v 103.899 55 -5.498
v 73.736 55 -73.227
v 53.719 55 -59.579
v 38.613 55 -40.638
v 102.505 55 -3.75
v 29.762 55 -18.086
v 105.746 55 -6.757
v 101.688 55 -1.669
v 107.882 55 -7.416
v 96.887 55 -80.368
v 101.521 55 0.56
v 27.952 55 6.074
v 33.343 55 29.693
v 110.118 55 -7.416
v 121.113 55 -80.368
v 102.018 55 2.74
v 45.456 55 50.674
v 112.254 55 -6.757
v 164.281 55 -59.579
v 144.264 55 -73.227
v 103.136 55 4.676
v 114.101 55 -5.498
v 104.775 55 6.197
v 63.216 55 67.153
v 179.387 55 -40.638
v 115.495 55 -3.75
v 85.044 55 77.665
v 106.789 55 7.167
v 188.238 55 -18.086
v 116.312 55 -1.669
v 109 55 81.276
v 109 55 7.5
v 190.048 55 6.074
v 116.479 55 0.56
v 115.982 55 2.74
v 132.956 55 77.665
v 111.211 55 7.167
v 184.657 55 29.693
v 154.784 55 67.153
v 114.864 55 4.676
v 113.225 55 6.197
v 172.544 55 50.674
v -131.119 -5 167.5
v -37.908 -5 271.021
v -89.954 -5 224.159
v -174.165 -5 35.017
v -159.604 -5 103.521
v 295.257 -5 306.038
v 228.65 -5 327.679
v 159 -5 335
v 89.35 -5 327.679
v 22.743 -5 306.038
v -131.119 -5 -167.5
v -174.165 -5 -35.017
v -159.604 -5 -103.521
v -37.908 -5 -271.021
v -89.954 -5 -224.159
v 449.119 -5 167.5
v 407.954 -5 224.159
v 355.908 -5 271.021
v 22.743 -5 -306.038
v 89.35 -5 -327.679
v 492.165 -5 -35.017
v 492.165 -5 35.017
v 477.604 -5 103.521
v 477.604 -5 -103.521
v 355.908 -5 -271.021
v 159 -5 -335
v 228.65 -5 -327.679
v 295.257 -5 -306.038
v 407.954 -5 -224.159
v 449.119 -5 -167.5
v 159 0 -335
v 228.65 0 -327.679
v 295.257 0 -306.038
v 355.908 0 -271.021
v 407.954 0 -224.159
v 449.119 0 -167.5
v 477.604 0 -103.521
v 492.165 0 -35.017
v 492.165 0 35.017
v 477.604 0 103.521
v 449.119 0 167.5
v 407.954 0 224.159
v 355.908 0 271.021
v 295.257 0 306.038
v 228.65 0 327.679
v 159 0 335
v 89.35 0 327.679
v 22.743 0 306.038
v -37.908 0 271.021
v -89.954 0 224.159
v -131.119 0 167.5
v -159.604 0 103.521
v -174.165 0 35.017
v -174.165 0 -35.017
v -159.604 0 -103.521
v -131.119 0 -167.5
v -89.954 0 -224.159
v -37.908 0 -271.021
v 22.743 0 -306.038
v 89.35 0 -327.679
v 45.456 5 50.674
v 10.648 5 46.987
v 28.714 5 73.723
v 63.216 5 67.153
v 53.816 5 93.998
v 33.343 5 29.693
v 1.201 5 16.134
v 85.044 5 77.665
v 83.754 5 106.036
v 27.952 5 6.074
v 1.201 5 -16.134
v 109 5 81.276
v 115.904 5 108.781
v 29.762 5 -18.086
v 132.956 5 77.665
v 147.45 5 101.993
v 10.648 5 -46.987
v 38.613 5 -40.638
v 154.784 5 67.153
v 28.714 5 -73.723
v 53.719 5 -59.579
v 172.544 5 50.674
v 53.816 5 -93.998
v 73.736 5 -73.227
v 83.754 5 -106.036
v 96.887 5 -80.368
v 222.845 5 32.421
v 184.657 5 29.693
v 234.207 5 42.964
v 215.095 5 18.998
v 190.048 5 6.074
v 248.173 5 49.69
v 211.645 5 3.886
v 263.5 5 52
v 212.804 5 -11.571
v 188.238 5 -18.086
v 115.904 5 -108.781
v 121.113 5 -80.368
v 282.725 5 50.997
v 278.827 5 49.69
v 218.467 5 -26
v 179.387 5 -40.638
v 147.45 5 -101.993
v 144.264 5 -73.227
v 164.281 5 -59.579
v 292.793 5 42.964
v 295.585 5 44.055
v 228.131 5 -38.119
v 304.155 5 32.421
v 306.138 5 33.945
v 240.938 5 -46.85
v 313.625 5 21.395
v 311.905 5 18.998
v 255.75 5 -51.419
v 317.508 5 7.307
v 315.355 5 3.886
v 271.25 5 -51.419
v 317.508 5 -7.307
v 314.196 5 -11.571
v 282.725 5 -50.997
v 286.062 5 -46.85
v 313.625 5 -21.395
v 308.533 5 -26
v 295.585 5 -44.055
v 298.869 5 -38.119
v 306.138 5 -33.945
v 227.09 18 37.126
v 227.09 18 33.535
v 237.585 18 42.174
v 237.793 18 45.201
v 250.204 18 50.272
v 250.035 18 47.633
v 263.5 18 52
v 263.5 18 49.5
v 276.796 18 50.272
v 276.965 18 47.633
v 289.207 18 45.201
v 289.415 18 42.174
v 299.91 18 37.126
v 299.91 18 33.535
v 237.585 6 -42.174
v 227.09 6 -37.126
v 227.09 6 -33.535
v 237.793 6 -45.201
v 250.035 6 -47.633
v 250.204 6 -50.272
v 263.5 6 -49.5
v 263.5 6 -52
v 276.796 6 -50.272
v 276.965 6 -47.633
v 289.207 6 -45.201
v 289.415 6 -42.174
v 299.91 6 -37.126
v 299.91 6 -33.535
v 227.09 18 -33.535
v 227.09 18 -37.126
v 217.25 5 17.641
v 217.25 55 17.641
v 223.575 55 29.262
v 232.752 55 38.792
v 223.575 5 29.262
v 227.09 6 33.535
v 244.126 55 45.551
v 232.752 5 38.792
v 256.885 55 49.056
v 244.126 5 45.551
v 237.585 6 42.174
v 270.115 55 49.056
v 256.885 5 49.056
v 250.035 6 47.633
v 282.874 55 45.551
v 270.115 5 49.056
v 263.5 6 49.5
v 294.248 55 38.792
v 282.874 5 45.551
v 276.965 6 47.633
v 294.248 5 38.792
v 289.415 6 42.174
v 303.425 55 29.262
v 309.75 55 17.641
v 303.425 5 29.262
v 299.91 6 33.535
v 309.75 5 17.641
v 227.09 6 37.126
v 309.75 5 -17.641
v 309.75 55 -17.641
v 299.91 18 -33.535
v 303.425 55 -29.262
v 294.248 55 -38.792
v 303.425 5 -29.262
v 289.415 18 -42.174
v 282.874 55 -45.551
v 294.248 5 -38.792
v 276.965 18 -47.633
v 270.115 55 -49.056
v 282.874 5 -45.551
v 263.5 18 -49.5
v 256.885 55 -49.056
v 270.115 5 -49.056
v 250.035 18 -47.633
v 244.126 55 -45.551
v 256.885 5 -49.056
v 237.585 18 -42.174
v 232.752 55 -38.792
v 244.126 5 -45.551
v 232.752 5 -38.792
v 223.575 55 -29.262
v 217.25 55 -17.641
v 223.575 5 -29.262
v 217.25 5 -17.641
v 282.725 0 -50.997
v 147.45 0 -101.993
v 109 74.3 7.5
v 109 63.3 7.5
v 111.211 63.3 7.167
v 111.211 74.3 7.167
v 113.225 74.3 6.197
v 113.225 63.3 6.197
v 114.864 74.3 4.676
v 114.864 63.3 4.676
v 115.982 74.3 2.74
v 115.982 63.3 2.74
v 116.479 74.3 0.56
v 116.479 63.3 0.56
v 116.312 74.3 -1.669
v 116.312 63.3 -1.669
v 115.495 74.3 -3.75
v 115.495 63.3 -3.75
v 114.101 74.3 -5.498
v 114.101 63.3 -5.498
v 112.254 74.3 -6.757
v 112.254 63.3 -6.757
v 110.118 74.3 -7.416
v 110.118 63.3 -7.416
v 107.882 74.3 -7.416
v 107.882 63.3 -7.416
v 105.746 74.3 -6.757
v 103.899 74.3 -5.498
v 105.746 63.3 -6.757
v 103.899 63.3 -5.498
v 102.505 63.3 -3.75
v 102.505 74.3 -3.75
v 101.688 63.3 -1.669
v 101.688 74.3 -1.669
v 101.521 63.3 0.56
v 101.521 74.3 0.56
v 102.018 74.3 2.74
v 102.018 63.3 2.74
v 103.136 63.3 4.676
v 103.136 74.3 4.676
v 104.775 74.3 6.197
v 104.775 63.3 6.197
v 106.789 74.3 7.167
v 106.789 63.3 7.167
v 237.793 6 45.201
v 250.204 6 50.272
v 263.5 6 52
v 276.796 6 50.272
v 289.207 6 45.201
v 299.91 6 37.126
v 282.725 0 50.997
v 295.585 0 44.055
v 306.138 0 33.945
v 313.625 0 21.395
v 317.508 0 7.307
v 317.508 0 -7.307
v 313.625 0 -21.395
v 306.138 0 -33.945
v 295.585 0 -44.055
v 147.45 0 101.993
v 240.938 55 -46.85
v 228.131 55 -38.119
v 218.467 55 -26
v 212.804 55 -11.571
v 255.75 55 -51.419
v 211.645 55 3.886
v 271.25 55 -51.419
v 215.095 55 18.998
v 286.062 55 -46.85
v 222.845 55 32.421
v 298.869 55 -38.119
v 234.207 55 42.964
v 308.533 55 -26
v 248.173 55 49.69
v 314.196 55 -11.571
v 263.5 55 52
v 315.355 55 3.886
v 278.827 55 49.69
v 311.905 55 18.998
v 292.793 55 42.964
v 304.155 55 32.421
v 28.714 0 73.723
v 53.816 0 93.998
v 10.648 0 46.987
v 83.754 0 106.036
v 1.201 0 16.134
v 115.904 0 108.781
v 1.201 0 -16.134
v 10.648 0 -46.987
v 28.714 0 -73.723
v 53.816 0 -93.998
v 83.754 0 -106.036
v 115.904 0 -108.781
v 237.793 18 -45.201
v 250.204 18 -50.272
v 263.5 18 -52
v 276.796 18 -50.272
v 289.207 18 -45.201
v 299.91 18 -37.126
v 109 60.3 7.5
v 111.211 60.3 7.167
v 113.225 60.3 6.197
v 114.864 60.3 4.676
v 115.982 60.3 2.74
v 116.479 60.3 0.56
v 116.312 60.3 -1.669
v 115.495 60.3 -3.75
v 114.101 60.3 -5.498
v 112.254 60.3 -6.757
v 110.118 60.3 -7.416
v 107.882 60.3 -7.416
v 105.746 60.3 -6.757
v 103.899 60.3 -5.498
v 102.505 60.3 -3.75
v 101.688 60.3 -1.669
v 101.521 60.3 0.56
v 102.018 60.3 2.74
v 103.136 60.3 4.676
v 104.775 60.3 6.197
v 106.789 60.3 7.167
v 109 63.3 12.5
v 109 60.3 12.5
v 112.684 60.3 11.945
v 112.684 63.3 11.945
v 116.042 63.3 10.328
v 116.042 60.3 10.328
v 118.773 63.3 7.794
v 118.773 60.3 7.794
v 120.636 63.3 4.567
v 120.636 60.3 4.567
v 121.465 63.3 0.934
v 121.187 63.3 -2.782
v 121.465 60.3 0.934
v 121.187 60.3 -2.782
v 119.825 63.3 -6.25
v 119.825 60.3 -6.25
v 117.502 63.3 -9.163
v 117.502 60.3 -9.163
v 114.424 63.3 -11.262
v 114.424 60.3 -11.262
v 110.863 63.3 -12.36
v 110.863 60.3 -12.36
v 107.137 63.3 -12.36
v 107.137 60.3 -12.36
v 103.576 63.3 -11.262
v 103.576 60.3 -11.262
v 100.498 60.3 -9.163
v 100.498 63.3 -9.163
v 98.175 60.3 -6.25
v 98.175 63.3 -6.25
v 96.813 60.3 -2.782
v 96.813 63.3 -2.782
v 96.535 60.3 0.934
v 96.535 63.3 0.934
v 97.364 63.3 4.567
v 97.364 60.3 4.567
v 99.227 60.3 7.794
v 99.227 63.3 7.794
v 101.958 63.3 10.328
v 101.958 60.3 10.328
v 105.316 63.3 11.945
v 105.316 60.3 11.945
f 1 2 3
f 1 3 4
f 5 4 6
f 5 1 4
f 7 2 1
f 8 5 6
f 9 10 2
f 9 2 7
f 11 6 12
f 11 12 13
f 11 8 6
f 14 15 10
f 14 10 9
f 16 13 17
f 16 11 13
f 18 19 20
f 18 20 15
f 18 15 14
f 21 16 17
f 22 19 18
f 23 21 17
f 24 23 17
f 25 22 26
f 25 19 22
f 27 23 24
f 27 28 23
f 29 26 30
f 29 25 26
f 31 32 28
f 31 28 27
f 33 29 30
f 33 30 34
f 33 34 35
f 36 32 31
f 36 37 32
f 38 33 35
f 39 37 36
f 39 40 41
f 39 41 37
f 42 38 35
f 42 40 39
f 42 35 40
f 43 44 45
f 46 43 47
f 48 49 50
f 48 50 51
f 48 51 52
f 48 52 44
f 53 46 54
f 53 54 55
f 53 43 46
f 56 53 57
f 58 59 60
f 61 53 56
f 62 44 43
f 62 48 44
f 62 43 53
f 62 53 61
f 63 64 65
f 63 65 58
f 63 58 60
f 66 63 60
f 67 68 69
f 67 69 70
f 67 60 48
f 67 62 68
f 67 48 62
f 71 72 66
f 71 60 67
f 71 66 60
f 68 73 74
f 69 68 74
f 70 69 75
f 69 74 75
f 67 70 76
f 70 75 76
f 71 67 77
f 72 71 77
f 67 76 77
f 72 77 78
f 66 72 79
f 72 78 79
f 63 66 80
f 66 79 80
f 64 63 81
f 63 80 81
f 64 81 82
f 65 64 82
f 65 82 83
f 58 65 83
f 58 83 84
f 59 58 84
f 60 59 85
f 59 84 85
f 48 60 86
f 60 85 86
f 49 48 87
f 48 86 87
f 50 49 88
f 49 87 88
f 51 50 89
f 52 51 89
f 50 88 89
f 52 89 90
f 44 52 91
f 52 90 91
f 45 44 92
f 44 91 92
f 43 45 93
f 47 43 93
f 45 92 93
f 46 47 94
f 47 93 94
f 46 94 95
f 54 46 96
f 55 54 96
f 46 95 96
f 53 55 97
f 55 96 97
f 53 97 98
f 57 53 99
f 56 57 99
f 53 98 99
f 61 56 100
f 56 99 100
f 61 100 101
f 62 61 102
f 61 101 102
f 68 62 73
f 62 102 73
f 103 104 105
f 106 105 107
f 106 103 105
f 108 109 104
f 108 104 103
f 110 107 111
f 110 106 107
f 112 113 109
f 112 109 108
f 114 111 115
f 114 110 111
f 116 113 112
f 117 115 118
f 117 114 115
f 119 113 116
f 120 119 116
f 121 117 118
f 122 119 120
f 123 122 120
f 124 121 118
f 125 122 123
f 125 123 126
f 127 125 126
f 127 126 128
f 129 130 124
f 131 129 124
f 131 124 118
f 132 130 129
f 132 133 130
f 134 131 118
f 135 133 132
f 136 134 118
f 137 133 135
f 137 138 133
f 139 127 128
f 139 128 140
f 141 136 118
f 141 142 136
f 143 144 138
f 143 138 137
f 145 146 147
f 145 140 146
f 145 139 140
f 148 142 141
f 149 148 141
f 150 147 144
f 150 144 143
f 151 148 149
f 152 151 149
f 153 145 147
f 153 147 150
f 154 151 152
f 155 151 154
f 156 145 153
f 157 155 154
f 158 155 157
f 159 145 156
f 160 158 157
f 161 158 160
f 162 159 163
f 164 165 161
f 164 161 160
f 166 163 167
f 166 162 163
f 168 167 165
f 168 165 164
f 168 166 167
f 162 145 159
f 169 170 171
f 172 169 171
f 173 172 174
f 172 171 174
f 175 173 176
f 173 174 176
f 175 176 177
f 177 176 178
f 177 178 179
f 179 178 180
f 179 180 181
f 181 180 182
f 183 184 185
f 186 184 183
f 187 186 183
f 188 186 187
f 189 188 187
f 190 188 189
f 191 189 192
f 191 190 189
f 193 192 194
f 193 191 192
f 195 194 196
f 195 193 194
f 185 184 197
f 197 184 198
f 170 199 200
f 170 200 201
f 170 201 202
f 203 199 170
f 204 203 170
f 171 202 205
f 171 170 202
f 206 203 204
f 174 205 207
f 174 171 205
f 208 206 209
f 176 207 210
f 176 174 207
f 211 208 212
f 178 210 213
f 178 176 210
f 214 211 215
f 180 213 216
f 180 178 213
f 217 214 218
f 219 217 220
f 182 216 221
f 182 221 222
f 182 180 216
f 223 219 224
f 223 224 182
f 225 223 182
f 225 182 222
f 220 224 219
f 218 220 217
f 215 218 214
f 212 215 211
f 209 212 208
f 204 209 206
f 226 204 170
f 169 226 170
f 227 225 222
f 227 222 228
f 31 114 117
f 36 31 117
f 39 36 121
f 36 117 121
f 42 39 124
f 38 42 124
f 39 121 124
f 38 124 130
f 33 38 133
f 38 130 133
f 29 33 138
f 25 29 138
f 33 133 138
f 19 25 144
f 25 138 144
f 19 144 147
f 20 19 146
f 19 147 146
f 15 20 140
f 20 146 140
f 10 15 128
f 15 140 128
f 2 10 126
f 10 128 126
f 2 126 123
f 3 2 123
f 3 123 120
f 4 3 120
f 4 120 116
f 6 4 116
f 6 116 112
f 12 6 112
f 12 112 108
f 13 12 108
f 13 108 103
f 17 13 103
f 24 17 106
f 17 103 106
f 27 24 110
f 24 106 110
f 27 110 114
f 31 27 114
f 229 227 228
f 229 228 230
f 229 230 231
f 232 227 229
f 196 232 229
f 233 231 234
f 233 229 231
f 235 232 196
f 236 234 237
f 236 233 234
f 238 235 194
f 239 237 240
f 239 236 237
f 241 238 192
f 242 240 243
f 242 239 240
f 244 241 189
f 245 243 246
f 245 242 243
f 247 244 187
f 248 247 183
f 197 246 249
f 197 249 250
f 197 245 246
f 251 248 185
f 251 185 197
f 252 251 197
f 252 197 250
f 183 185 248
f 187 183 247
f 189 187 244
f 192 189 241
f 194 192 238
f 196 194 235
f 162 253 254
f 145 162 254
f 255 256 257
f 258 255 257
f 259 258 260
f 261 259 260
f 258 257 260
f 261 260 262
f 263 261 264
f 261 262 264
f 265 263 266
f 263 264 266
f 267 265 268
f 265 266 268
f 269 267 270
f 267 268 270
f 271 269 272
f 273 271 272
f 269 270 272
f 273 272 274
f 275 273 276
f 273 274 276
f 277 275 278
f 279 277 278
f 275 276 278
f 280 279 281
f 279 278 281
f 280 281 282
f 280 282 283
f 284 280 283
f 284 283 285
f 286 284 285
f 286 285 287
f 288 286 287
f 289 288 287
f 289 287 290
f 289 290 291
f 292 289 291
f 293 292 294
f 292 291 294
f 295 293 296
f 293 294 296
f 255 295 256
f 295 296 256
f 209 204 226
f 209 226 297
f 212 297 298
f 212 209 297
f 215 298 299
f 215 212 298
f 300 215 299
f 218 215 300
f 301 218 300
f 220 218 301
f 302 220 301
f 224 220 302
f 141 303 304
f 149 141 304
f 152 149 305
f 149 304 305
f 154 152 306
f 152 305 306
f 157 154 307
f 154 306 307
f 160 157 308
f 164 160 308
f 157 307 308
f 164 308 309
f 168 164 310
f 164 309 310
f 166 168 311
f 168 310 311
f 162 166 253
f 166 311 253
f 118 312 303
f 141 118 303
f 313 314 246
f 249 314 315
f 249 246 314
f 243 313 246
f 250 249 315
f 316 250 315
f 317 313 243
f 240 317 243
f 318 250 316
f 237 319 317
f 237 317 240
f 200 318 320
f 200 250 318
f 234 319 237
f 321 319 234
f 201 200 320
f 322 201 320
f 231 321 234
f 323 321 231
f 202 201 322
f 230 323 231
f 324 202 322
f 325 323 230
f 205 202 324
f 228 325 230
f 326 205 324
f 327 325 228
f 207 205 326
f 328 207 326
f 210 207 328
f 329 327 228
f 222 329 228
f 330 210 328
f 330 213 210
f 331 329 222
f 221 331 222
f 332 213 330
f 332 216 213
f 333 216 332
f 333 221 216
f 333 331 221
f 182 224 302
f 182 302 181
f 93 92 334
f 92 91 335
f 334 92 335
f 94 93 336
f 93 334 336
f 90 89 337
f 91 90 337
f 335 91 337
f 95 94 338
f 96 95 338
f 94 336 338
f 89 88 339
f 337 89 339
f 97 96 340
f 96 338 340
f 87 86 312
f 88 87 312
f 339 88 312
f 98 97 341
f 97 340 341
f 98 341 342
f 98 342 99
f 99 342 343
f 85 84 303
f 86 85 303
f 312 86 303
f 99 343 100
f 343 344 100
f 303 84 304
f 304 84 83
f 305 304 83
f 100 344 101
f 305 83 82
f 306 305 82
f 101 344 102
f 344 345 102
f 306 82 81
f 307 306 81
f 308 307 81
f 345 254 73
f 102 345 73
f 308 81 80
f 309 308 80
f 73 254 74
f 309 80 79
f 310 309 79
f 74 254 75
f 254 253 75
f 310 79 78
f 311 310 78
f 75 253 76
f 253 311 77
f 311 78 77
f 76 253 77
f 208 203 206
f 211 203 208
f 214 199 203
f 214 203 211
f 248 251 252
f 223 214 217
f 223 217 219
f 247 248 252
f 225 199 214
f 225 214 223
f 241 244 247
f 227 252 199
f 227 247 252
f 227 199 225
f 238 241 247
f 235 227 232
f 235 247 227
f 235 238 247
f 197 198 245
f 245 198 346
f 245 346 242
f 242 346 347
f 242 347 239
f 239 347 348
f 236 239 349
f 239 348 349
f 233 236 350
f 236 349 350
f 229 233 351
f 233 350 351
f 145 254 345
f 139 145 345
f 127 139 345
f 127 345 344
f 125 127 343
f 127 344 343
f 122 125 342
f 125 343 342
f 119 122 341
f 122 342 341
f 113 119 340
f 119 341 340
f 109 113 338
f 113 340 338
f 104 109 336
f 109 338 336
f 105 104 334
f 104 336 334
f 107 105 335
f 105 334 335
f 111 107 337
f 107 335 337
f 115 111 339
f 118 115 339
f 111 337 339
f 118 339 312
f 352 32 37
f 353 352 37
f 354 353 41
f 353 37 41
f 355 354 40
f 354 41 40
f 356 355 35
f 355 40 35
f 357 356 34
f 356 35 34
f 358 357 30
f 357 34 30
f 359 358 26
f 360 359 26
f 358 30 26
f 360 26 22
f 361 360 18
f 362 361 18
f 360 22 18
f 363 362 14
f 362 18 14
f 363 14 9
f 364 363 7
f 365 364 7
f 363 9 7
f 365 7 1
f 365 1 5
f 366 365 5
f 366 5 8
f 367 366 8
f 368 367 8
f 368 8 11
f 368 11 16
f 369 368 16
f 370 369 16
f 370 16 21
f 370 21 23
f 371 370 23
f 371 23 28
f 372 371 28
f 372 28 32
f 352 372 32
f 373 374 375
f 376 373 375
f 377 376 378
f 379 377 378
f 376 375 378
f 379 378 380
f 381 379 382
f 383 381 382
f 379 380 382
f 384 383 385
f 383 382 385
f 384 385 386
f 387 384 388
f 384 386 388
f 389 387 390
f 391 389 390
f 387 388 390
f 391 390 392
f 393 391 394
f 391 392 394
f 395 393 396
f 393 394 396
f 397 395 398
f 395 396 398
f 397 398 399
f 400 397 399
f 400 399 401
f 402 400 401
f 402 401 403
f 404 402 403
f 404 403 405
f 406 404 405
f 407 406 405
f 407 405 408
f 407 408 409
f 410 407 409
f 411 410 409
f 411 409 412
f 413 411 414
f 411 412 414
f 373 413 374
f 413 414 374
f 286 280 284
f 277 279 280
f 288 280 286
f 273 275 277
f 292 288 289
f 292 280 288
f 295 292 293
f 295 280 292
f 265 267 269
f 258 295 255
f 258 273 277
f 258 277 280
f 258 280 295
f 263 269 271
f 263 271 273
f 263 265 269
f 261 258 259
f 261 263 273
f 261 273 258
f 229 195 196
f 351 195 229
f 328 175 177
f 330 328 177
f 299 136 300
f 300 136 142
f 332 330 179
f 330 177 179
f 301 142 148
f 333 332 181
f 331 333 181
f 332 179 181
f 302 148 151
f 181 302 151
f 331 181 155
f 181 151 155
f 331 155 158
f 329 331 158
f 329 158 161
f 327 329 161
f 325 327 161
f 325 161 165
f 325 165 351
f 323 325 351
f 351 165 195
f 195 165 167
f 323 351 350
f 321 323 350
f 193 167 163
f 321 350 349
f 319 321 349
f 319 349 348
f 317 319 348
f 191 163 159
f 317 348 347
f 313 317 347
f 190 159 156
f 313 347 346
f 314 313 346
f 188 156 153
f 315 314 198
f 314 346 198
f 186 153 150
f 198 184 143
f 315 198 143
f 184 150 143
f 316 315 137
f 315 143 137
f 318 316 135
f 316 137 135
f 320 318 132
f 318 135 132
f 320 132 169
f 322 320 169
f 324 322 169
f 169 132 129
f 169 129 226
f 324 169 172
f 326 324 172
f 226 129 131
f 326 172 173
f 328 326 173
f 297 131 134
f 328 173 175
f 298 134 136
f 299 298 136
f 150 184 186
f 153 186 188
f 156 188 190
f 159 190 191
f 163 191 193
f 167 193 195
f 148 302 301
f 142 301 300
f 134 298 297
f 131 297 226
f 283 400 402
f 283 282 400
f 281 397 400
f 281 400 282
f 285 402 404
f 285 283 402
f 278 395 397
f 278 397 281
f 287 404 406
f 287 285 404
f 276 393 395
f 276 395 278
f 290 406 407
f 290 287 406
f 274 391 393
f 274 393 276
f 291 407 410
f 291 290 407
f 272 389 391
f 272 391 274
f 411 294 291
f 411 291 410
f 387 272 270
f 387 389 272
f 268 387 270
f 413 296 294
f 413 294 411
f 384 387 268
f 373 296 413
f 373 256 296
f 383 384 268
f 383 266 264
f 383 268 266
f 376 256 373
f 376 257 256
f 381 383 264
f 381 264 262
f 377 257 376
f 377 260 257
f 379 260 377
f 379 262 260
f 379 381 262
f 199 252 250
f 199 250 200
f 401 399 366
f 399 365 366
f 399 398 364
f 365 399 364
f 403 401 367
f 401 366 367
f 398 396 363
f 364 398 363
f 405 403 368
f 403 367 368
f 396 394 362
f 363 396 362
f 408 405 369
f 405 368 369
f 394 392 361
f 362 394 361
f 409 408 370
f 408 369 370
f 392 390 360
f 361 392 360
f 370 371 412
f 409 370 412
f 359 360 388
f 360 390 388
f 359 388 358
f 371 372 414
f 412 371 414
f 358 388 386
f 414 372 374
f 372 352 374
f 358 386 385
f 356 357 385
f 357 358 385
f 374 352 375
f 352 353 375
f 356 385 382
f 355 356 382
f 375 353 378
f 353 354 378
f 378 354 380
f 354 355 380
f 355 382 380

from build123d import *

# Parameters (mm, degrees)
EXTRUDE_1_DEPTH          = 5
SKETCH_2_R               = 52
EXTRUDE_2_DEPTH          = 50
SKETCH_3_R               = 7.5
EXTRUDE_3_DEPTH          = 55.3
SKETCH_4_R               = 12.5
EXTRUDE_4_DEPTH          = 3
SKETCH_5_R               = 7.5
EXTRUDE_5_DEPTH          = 11
SKETCH_6_R               = 81.275582603
EXTRUDE_6_DEPTH          = 50
SKETCH_7_R               = 335
EXTRUDE_7_DEPTH          = 5
CUT_EXTRUDE_1_DEPTH      = 632.922060068
CUT_EXTRUDE_1_DEPTH_BACK = 632.922060068
SKETCH_8_W               = 72.819825202
SKETCH_8_H               = 12


with BuildPart() as part:
    # 草图1 → 凸台-拉伸1 (new body)
    with BuildSketch(Plane(origin=(0, 0, 0), x_dir=(1, 0, 0), z_dir=(0, 1, 0))):
        with BuildLine():
            Line((282.724919094, 50.996592885), (147.449838188, 101.993185769))
            ThreePointArc((147.449838188, 101.993185769), (0, 0), (147.449838188, -101.993185769))
            Line((147.449838188, -101.993185769), (282.724919094, -50.996592885))
            ThreePointArc((282.724919094, -50.996592885), (318, 0), (282.724919094, 50.996592885))
        make_face()
    extrude(amount=EXTRUDE_1_DEPTH)

    # 草图2 → 凸台-拉伸2 (add)
    with BuildSketch(Plane(origin=(0, 5, 0), x_dir=(1, 0, 0), z_dir=(0, 1, 0))):
        with Locations(Location((263.5, 0, 0), (0, 0, 270))):
            Circle(SKETCH_2_R)
        with BuildLine():
            Line((217.25, 17.640507362), (217.25, -17.640507362))
            ThreePointArc((217.25, -17.640507362), (263.5, -49.5), (309.75, -17.640507362))
            Line((309.75, -17.640507362), (309.75, 17.640507362))
            ThreePointArc((309.75, 17.640507362), (263.5, 49.5), (217.25, 17.640507362))
        make_face(mode=Mode.SUBTRACT)
    extrude(amount=EXTRUDE_2_DEPTH)

    # 草图3 → 凸台-拉伸3 (add)
    with BuildSketch(Plane(origin=(0, 5, 0), x_dir=(1, 0, 0), z_dir=(0, 1, 0))):
        with Locations(Location((109, 0, 0), (0, 0, 270))):
            Circle(SKETCH_3_R)
    extrude(amount=EXTRUDE_3_DEPTH)

    # 草图4 → 凸台-拉伸4 (add)
    with BuildSketch(Plane(origin=(0, 60.3, 0), x_dir=(1, 0, 0), z_dir=(0, 1, 0))):
        with Locations(Location((109, 0, 0), (0, 0, 270))):
            Circle(SKETCH_4_R)
    extrude(amount=EXTRUDE_4_DEPTH)

    # 草图5 → 凸台-拉伸5 (add)
    with BuildSketch(Plane(origin=(0, 63.3, 0), x_dir=(1, 0, 0), z_dir=(0, 1, 0))):
        with Locations(Location((109, 0, 0), (0, 0, 270))):
            Circle(SKETCH_5_R)
    extrude(amount=EXTRUDE_5_DEPTH)

    # 草图6 → 凸台-拉伸6 (add)
    with BuildSketch(Plane(origin=(0, 5, 0), x_dir=(1, 0, 0), z_dir=(0, 1, 0))):
        with Locations(Location((109, 0, 0), (0, 0, 270))):
            Circle(SKETCH_6_R)
    extrude(amount=EXTRUDE_6_DEPTH)

    # 草图7 → 凸台-拉伸7 (add)
    with BuildSketch(Plane(origin=(0, 0, 0), x_dir=(-1, 0, 0), z_dir=(0, -1, 0))):
        with Locations(Location((-159, 0, 0), (0, 0, 90))):
            Circle(SKETCH_7_R)
    extrude(amount=EXTRUDE_7_DEPTH)

    # 草图8 → 切除-拉伸1 (cut, two sides: drawn at the far end of the back side and taken through both)
    with BuildSketch(Plane.XY.offset(52).offset(-CUT_EXTRUDE_1_DEPTH_BACK)):
        with Locations((263.5, 12)):
            Rectangle(SKETCH_8_W, SKETCH_8_H)
    extrude(amount=CUT_EXTRUDE_1_DEPTH + CUT_EXTRUDE_1_DEPTH_BACK, mode=Mode.SUBTRACT)


solid = part.part
